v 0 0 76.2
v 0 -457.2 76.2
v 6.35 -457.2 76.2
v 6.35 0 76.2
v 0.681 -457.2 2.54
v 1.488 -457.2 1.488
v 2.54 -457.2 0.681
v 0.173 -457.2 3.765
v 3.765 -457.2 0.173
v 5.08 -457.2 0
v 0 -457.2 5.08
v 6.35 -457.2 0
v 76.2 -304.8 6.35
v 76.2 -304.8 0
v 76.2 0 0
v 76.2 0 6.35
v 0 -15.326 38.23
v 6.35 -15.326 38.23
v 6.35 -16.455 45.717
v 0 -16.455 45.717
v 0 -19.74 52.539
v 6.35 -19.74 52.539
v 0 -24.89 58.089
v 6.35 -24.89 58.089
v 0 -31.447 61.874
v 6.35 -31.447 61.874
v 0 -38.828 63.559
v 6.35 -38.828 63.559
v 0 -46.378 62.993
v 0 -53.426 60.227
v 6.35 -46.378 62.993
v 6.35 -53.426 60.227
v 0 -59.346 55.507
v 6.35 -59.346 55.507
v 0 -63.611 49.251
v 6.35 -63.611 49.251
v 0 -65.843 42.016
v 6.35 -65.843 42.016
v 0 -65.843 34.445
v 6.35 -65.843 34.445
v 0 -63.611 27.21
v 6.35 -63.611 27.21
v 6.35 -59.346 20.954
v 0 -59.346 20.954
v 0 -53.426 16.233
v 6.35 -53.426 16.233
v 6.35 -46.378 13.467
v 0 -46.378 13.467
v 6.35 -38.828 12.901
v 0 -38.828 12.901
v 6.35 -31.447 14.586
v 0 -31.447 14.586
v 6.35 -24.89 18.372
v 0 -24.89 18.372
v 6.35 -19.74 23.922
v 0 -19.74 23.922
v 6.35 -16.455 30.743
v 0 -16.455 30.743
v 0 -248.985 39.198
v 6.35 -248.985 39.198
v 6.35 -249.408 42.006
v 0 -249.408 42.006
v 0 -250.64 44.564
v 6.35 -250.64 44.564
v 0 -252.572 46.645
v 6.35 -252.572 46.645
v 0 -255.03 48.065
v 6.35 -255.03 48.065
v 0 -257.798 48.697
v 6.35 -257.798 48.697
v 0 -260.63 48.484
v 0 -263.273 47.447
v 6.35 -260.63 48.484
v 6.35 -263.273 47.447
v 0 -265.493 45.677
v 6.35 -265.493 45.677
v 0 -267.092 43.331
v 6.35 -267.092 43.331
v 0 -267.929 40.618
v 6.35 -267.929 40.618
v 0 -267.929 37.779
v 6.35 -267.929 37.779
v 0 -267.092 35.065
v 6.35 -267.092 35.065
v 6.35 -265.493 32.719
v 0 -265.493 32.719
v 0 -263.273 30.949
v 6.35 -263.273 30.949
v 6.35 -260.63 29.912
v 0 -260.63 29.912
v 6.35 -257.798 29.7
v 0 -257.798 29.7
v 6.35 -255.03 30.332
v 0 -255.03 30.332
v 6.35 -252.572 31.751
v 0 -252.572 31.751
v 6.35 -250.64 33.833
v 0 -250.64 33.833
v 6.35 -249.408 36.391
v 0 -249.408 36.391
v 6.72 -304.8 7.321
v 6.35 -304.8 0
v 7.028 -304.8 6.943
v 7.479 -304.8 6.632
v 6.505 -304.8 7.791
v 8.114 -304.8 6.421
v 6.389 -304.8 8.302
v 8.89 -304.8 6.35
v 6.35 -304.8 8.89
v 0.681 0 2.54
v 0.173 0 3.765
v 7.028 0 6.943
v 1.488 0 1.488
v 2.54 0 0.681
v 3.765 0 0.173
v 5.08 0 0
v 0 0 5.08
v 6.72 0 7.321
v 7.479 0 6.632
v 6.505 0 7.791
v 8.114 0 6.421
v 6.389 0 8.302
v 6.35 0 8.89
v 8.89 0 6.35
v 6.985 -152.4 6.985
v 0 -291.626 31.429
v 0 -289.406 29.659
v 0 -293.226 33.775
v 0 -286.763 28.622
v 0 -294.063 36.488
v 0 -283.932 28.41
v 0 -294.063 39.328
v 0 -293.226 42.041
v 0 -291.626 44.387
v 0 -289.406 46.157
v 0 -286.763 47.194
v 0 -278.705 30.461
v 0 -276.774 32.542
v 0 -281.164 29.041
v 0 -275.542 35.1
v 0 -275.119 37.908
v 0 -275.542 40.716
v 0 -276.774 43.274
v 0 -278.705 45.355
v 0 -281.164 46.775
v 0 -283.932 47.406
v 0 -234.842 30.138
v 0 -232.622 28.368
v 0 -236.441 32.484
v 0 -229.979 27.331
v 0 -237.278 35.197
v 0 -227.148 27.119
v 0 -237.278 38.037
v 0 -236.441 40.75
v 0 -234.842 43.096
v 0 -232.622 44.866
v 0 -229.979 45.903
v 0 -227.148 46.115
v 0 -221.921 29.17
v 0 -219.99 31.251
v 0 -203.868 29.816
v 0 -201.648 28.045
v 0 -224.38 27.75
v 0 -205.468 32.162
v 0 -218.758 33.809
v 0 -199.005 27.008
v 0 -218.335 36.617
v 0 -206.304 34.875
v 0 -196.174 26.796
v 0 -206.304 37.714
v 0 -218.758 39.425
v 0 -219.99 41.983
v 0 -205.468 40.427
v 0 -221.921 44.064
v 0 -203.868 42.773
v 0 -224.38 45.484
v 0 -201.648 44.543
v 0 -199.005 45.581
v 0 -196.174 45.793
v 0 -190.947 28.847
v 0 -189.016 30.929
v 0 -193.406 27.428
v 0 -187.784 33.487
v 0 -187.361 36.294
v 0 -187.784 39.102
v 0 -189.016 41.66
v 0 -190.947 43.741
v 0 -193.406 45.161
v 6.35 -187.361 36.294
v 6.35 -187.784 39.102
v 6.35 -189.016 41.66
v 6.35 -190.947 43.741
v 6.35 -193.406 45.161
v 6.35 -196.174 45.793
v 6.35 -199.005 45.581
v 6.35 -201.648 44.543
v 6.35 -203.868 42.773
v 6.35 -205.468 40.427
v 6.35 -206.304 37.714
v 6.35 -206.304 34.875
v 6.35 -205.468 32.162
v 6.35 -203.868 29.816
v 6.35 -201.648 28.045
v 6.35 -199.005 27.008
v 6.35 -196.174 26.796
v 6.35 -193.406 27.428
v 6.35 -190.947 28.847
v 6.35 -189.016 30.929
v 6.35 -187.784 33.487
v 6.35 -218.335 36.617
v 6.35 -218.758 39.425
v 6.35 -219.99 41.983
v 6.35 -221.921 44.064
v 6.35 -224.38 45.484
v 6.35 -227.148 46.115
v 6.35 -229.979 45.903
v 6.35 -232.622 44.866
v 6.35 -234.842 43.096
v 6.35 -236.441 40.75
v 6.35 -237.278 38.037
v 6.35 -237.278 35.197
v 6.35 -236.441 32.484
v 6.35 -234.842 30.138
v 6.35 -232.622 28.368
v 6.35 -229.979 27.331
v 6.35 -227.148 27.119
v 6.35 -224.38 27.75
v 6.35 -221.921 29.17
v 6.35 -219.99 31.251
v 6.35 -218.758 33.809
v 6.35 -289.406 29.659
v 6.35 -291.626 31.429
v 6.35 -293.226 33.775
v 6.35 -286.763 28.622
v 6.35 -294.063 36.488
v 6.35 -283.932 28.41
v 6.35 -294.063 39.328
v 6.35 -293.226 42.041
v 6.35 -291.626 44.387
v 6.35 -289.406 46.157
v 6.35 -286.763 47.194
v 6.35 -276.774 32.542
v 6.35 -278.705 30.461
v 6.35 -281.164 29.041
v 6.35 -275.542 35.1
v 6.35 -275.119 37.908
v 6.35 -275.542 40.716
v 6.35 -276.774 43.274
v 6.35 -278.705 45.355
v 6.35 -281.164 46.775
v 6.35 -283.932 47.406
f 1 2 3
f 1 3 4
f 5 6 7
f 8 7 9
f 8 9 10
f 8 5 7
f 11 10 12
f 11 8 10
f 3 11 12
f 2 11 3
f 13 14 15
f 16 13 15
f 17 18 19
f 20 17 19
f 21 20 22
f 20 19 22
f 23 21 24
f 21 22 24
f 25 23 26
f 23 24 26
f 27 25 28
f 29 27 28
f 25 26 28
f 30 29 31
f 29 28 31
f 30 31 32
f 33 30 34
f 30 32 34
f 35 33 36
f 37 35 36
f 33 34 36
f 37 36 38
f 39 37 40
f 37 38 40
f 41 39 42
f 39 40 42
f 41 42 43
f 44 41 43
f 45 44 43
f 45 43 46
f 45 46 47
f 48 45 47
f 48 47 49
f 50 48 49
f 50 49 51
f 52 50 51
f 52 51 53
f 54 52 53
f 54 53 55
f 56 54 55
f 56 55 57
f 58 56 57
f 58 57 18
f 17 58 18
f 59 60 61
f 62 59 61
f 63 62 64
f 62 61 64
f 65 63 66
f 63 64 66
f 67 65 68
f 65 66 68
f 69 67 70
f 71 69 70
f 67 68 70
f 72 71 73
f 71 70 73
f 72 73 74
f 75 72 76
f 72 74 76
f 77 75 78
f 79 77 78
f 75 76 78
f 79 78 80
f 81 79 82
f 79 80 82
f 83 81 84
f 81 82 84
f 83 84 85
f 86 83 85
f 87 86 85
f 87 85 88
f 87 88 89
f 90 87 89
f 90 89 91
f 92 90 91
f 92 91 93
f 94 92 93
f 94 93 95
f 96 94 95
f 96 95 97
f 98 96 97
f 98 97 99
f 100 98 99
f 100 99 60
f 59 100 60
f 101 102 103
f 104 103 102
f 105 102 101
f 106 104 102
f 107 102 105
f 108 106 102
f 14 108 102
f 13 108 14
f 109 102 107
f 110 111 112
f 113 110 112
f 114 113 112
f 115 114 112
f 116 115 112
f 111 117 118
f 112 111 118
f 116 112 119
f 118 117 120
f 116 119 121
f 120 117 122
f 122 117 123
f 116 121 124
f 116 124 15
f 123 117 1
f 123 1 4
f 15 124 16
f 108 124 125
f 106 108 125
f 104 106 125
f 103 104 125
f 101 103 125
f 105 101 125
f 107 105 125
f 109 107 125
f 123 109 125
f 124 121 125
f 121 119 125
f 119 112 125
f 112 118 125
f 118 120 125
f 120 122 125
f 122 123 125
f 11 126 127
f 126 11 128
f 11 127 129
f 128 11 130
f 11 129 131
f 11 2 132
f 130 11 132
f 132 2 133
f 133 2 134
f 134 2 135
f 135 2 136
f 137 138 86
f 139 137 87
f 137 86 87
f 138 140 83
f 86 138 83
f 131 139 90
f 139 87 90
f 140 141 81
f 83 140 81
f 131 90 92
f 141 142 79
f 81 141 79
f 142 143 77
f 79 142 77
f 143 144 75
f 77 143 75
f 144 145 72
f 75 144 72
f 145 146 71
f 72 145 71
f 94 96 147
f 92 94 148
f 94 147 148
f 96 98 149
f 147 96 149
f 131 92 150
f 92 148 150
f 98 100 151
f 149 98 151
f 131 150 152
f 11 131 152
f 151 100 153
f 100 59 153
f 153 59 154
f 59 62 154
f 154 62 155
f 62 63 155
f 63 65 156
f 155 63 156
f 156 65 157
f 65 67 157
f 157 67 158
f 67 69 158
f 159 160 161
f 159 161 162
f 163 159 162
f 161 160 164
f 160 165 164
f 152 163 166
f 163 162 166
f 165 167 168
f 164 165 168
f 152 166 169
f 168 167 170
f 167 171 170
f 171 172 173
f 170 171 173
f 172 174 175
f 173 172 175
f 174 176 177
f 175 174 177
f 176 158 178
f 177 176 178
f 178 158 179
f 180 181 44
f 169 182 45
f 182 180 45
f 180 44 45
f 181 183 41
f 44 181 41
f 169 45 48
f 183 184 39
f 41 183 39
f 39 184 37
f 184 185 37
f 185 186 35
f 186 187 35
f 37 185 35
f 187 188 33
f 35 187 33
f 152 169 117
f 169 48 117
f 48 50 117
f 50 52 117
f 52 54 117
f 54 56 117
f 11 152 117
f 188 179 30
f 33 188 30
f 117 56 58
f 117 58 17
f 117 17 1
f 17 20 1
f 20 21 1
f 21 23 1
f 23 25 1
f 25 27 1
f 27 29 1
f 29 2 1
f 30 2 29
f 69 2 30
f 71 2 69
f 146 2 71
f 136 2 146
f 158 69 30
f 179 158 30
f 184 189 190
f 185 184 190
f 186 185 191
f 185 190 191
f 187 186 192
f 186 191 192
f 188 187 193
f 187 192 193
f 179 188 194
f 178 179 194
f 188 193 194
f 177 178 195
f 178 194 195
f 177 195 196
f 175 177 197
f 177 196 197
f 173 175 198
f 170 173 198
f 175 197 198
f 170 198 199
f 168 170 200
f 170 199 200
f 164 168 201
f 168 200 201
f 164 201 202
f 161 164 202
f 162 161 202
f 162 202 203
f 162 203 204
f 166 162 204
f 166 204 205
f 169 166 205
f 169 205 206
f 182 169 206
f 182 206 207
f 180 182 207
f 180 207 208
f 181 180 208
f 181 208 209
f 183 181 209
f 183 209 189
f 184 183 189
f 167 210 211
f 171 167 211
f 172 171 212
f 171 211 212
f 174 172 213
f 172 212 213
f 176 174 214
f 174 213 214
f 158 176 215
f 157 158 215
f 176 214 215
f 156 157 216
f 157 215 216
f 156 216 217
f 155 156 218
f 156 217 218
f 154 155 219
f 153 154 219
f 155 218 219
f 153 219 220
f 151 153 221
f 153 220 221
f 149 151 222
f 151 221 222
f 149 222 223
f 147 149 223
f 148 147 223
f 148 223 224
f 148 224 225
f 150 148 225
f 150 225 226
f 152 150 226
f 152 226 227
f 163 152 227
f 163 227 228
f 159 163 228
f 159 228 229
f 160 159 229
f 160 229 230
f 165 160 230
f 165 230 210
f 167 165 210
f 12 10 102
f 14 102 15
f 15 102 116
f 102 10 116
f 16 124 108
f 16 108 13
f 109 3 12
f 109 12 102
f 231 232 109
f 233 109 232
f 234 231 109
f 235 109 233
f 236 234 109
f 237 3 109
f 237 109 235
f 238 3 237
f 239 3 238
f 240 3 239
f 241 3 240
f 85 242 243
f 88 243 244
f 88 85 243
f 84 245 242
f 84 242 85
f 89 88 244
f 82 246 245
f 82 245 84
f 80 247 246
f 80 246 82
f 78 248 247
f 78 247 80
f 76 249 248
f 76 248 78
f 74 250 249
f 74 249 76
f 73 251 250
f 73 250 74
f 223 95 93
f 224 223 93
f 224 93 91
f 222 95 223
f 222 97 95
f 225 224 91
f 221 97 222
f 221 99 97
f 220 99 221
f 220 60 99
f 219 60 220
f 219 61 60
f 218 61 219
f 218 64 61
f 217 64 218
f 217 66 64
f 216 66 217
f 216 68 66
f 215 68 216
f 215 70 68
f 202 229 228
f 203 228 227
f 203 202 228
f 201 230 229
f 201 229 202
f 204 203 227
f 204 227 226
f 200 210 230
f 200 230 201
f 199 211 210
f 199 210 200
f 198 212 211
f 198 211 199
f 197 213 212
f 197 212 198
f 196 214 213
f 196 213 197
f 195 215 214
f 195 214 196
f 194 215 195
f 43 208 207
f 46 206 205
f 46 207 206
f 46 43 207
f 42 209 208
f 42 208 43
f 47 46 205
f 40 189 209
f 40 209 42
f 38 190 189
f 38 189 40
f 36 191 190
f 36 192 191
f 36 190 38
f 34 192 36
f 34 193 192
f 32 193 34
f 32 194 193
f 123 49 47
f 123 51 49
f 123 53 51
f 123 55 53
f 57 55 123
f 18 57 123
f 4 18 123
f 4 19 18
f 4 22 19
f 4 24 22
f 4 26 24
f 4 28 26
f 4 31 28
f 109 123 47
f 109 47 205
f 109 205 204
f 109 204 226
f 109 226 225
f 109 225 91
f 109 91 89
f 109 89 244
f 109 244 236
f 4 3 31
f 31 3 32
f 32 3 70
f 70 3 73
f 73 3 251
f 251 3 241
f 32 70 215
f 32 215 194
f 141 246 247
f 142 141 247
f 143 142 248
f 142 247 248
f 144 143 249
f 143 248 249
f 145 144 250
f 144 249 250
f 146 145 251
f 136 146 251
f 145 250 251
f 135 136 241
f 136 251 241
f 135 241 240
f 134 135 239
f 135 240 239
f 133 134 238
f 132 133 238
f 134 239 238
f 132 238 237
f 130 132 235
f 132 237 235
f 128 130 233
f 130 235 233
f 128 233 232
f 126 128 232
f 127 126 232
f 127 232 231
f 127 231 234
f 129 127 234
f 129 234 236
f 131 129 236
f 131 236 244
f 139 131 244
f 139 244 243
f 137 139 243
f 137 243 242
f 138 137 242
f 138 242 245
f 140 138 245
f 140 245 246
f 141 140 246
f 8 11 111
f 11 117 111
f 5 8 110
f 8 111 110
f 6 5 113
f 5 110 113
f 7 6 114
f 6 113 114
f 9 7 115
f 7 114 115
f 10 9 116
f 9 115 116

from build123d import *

# Parameters (mm, degrees)
F0_W        = 76.2
F0_H        = 304.8
F1_DEPTH    = 6.35
F2_W        = 457.2
F2_H        = 76.2
F3_DEPTH    = 6.35
F4_R        = 5.08
F5_T1_DEPTH = 304.8
F6_R        = 9.525
F7_DEPTH    = 25.4
F8_R        = 9.525
F9_DEPTH    = 25.4
F10_R       = 9.525
F11_DEPTH   = 25.4
F12_R       = 9.525
F13_DEPTH   = 25.4
F14_R       = 25.4
F15_DEPTH   = 25.4


# Not quite as in the source:
# - a fillet or chamfer that OpenCascade refuses, or shapes differently, is made with other operations: its cross-section is extruded or revolved along the edge and cut away or added


with BuildPart() as f1:
    # F0 (on Top) → F1 (new body)
    with BuildSketch(Plane.XY):
        with Locations((38.1, -152.4)):
            Rectangle(F0_W, F0_H)
    extrude(amount=F1_DEPTH)

    # F2 (on Right) → F3 (join)
    with BuildSketch(Plane.YZ):
        with Locations((-228.6, 38.1)):
            Rectangle(F2_W, F2_H)
    extrude(amount=F3_DEPTH)

    # F4
    f4_edges = [f1.edges().sort_by_distance(p)[0] for p in [
        (0, -228.6, 0),
    ]]
    fillet(f4_edges, radius=F4_R)

    # F5: fillet of radius 2.54 on 1 edges, made by hand

    # F5_s2 → F5_t1 (join)
    with BuildSketch(Plane.XZ):
        with BuildLine():
            add(Edge.make_bspline(
                [(8.89, 6.35), (6.35, 6.35), (6.35, 8.89)],
                knots=[0, 0, 0, 1, 1, 1], degree=2, weights=[1, 1, 1]))
            Line((6.35, 8.89), (6.35, 6.35))
            Line((6.35, 6.35), (8.89, 6.35))
        make_face()
    extrude(amount=F5_T1_DEPTH)

    # F6 (on face) → F7 (cut)
    with BuildSketch(Plane.YZ.offset(6.35)):
        with Locations((-284.6438884735, 37.907961756)):
            Circle(F6_R)
    extrude(amount=-F7_DEPTH, mode=Mode.SUBTRACT)

    # F8 (on face) → F9 (cut)
    with BuildSketch(Plane.YZ.offset(6.35)):
        with Locations((-258.5102617741, 39.1981378198)):
            Circle(F8_R)
    extrude(amount=-F9_DEPTH, mode=Mode.SUBTRACT)

    # F10 (on face) → F11 (cut)
    with BuildSketch(Plane.YZ.offset(6.35)):
        with Locations((-227.8595268726, 36.6169922054)):
            Circle(F10_R)
    extrude(amount=-F11_DEPTH, mode=Mode.SUBTRACT)

    # F12 (on face) → F13 (cut)
    with BuildSketch(Plane.YZ.offset(6.35)):
        with Locations((-196.8858391047, 36.2943448126)):
            Circle(F12_R)
    extrude(amount=-F13_DEPTH, mode=Mode.SUBTRACT)

    # F14 (on face) → F15 (cut)
    with BuildSketch(Plane.YZ.offset(6.35)):
        with Locations((-40.7262966037, 38.2302068174)):
            Circle(F14_R)
    extrude(amount=-F15_DEPTH, mode=Mode.SUBTRACT)


solid = f1.part
